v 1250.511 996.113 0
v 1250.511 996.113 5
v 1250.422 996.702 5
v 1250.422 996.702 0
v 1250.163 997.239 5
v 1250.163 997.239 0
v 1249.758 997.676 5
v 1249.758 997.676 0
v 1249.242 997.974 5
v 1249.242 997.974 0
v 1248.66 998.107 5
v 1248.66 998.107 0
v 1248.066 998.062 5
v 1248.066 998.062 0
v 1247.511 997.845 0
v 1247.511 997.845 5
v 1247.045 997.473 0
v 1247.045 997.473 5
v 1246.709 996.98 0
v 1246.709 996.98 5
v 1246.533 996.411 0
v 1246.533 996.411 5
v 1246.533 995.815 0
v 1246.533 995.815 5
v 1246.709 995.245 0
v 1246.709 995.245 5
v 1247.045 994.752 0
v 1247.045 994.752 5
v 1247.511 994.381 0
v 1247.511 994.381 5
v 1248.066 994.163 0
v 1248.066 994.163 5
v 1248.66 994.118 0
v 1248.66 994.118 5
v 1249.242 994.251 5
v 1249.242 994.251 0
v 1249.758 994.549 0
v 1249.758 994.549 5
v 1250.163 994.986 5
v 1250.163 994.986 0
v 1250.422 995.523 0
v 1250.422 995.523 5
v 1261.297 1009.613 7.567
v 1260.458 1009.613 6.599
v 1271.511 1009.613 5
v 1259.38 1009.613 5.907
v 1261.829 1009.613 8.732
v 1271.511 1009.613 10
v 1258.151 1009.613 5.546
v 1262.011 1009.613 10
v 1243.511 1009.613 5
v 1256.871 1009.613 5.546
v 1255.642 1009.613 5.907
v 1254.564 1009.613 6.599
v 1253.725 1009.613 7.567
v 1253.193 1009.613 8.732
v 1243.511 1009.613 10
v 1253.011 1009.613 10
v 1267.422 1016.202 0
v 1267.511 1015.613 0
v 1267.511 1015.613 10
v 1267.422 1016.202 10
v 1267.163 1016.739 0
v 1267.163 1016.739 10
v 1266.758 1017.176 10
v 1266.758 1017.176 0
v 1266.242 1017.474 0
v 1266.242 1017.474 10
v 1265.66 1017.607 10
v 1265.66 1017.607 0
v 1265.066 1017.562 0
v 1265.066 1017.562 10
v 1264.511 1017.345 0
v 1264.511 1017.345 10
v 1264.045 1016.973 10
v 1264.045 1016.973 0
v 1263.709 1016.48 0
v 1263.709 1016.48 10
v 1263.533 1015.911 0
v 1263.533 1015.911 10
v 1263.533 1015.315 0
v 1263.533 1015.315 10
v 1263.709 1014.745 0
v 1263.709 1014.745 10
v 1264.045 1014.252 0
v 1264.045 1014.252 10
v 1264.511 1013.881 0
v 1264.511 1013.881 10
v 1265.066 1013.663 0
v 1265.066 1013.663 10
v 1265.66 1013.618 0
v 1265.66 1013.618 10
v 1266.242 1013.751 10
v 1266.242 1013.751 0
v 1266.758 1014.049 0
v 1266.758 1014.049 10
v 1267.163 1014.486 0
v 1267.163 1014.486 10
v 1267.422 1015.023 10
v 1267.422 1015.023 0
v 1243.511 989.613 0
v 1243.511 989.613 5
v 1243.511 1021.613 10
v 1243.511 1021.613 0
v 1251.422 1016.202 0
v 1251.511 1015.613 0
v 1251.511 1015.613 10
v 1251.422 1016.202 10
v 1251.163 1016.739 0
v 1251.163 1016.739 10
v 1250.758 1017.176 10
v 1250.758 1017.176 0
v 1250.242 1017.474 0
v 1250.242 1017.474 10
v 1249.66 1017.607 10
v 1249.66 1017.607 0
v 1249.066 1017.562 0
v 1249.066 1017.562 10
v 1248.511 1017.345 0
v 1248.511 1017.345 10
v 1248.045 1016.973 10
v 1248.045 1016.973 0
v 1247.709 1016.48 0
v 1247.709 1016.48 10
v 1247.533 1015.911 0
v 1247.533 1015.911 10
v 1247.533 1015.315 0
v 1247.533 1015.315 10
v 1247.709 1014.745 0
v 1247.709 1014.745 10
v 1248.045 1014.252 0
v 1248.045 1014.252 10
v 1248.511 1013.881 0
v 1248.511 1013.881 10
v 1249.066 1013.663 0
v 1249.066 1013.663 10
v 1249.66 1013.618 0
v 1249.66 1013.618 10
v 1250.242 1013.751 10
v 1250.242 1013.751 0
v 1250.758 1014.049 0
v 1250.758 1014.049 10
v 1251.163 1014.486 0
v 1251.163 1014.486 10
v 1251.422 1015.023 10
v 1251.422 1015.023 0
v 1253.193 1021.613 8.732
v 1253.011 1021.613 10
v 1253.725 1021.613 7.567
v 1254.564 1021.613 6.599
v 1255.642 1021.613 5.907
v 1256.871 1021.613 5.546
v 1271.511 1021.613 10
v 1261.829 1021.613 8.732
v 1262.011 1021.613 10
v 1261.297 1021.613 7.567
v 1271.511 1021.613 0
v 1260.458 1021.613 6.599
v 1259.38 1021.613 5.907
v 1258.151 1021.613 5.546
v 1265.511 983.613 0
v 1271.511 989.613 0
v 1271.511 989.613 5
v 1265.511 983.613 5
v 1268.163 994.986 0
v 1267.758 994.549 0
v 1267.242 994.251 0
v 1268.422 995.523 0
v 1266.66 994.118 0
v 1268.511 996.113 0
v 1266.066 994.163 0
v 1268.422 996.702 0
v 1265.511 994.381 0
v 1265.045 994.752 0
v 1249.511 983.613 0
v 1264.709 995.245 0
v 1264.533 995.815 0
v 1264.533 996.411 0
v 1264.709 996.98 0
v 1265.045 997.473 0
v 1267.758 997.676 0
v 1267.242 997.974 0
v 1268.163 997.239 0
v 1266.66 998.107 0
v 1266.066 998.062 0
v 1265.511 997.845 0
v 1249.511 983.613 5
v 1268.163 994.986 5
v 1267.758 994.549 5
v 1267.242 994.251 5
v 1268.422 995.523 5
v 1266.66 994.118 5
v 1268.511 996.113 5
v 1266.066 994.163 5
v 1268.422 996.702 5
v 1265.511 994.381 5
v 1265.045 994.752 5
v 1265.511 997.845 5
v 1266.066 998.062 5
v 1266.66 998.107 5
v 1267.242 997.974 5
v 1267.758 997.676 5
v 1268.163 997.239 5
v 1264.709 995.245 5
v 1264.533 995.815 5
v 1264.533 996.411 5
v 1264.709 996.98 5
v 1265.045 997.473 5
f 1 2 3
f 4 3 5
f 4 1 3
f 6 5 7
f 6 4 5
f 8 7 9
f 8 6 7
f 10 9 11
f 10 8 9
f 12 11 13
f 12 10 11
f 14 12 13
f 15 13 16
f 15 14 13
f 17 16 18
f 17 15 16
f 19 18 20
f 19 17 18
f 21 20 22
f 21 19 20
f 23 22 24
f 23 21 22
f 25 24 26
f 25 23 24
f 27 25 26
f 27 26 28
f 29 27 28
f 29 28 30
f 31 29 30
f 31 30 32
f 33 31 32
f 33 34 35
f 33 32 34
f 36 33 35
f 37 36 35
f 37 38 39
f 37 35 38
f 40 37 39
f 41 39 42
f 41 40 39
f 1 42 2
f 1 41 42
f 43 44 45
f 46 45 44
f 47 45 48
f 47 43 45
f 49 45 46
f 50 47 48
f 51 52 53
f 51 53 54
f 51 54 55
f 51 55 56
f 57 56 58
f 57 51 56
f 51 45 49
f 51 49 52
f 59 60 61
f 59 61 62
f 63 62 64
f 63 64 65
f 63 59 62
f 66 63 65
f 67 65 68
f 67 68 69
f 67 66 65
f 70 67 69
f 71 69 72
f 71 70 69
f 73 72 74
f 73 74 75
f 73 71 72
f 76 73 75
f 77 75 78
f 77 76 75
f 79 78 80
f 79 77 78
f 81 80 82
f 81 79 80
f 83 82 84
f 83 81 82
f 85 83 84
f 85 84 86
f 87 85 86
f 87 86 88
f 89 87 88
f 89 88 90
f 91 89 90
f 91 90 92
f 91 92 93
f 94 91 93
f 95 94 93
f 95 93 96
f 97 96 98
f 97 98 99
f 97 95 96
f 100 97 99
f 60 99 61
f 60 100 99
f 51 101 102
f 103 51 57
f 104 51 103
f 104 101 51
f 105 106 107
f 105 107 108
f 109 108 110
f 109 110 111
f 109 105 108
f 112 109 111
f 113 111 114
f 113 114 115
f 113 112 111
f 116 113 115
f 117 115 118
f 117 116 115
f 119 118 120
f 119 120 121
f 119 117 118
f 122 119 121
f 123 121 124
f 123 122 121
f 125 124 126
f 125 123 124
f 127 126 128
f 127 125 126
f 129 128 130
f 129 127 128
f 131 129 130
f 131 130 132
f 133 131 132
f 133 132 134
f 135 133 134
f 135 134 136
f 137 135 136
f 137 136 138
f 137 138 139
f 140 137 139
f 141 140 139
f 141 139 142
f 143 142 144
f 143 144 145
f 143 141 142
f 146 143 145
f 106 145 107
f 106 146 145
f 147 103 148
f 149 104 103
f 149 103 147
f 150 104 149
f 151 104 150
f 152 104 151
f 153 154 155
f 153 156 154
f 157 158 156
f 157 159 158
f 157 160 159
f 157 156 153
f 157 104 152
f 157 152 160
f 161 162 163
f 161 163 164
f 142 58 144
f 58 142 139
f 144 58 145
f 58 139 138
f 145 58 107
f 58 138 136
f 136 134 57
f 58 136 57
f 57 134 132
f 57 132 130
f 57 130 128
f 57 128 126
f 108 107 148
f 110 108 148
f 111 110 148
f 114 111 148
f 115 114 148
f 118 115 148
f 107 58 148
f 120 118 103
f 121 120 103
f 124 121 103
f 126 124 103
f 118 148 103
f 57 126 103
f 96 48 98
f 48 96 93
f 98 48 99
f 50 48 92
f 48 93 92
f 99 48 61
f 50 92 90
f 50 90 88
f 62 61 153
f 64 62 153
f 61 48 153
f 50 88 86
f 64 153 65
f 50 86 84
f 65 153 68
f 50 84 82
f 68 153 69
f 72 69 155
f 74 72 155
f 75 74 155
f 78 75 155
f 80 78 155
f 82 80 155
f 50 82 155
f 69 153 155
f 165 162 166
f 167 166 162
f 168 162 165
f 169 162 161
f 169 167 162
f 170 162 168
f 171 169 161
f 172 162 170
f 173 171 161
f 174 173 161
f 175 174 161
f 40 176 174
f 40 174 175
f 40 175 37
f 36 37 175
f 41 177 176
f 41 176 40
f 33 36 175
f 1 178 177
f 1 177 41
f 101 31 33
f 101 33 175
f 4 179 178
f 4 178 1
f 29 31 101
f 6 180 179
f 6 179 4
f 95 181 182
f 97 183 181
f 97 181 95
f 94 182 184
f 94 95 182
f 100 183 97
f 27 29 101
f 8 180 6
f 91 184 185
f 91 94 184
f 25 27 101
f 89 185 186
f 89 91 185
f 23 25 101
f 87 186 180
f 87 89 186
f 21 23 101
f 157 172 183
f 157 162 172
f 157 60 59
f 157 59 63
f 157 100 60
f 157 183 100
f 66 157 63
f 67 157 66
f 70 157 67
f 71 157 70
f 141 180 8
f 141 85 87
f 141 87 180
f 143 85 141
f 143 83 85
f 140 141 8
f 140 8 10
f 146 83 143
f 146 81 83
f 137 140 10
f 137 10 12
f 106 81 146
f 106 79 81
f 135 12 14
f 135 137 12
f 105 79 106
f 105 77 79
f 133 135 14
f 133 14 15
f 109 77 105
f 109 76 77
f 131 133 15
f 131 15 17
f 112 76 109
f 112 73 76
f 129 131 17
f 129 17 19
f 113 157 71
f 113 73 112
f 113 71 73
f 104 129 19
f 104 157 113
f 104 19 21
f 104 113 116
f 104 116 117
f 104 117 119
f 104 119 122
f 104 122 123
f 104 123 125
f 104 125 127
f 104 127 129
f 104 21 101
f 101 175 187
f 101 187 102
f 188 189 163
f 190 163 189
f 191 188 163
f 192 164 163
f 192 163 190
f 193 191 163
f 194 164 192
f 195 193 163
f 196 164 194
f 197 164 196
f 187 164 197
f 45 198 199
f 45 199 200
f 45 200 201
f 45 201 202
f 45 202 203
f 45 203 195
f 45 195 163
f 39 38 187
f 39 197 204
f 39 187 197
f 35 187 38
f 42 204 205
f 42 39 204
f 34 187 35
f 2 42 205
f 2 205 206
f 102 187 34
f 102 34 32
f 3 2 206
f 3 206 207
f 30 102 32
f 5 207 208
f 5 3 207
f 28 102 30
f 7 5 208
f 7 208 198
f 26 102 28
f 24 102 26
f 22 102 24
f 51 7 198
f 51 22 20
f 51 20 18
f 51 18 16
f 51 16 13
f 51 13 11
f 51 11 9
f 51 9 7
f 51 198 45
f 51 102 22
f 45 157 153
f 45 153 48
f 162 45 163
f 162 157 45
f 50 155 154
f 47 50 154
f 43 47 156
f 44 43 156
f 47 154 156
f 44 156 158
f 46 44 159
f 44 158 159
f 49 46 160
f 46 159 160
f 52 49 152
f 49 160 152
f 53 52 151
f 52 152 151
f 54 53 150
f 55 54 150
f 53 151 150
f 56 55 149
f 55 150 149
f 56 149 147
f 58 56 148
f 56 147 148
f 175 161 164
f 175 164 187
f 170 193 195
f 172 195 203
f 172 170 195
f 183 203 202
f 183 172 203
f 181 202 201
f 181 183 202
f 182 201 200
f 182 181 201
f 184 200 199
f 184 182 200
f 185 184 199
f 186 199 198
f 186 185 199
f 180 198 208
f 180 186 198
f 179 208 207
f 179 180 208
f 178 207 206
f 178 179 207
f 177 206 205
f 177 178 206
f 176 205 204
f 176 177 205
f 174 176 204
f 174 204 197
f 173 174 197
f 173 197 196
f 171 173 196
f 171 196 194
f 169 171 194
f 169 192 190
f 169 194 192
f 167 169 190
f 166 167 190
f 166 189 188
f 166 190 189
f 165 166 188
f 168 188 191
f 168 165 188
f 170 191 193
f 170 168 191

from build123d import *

# Parameters (mm, degrees)
SKETCH_1_R          = 2
EXTRUDE_1_DEPTH     = 10
CUT_EXTRUDE_2_REACH = 1024.045
SKETCH_2_W          = 6.505809731
SKETCH_2_H          = 33.357060804
SKETCH_3_R          = 4.5
CUT_EXTRUDE_3_DEPTH = 20


with BuildPart() as part:
    # 草图1 → 拉伸1 (new body)
    with BuildSketch(Plane.XY):
        Polygon((1243.510947309, 989.612625701), (1243.510947309, 1021.612625701), (1271.510947309, 1021.612625701), (1271.510947309, 989.612625701), (1265.510947309, 983.612625701), (1249.510947309, 983.612625701), align=None)
        with Locations((1265.510947309, 1015.612625701)):
            Circle(SKETCH_1_R, mode=Mode.SUBTRACT)
        with Locations((1249.510947309, 1015.612625701)):
            Circle(SKETCH_1_R, mode=Mode.SUBTRACT)
        with Locations((1248.510947309, 996.112625701)):
            Circle(SKETCH_1_R, mode=Mode.SUBTRACT)
        with Locations((1266.510947309, 996.112625701)):
            Circle(SKETCH_1_R, mode=Mode.SUBTRACT)
    extrude(amount=EXTRUDE_1_DEPTH)

    # 草图2 → 拉伸2 (cut, up to next)
    with BuildSketch(Plane.ZY.offset(-1243.510947309), mode=Mode.PRIVATE) as cut_extrude_2_sk1:
        with Locations((8.252904865, 992.934095299)):
            Rectangle(SKETCH_2_W, SKETCH_2_H)
    cut_extrude_2_tool1 = extrude(cut_extrude_2_sk1.sketch, amount=-CUT_EXTRUDE_2_REACH, mode=Mode.PRIVATE) & part.part
    add(cut_extrude_2_tool1.solids().sort_by_distance((1243.510947, 992.934095, 8.252905))[0], mode=Mode.SUBTRACT)

    # 草图3 → 拉伸3 (cut)
    with BuildSketch(Plane(origin=(0, 1021.612625701, 0), x_dir=(1, 0, 0), z_dir=(0, 1, 0))):
        with Locations((1257.510947309, -10)):
            Circle(SKETCH_3_R)
    extrude(amount=-CUT_EXTRUDE_3_DEPTH, mode=Mode.SUBTRACT)


solid = part.part
